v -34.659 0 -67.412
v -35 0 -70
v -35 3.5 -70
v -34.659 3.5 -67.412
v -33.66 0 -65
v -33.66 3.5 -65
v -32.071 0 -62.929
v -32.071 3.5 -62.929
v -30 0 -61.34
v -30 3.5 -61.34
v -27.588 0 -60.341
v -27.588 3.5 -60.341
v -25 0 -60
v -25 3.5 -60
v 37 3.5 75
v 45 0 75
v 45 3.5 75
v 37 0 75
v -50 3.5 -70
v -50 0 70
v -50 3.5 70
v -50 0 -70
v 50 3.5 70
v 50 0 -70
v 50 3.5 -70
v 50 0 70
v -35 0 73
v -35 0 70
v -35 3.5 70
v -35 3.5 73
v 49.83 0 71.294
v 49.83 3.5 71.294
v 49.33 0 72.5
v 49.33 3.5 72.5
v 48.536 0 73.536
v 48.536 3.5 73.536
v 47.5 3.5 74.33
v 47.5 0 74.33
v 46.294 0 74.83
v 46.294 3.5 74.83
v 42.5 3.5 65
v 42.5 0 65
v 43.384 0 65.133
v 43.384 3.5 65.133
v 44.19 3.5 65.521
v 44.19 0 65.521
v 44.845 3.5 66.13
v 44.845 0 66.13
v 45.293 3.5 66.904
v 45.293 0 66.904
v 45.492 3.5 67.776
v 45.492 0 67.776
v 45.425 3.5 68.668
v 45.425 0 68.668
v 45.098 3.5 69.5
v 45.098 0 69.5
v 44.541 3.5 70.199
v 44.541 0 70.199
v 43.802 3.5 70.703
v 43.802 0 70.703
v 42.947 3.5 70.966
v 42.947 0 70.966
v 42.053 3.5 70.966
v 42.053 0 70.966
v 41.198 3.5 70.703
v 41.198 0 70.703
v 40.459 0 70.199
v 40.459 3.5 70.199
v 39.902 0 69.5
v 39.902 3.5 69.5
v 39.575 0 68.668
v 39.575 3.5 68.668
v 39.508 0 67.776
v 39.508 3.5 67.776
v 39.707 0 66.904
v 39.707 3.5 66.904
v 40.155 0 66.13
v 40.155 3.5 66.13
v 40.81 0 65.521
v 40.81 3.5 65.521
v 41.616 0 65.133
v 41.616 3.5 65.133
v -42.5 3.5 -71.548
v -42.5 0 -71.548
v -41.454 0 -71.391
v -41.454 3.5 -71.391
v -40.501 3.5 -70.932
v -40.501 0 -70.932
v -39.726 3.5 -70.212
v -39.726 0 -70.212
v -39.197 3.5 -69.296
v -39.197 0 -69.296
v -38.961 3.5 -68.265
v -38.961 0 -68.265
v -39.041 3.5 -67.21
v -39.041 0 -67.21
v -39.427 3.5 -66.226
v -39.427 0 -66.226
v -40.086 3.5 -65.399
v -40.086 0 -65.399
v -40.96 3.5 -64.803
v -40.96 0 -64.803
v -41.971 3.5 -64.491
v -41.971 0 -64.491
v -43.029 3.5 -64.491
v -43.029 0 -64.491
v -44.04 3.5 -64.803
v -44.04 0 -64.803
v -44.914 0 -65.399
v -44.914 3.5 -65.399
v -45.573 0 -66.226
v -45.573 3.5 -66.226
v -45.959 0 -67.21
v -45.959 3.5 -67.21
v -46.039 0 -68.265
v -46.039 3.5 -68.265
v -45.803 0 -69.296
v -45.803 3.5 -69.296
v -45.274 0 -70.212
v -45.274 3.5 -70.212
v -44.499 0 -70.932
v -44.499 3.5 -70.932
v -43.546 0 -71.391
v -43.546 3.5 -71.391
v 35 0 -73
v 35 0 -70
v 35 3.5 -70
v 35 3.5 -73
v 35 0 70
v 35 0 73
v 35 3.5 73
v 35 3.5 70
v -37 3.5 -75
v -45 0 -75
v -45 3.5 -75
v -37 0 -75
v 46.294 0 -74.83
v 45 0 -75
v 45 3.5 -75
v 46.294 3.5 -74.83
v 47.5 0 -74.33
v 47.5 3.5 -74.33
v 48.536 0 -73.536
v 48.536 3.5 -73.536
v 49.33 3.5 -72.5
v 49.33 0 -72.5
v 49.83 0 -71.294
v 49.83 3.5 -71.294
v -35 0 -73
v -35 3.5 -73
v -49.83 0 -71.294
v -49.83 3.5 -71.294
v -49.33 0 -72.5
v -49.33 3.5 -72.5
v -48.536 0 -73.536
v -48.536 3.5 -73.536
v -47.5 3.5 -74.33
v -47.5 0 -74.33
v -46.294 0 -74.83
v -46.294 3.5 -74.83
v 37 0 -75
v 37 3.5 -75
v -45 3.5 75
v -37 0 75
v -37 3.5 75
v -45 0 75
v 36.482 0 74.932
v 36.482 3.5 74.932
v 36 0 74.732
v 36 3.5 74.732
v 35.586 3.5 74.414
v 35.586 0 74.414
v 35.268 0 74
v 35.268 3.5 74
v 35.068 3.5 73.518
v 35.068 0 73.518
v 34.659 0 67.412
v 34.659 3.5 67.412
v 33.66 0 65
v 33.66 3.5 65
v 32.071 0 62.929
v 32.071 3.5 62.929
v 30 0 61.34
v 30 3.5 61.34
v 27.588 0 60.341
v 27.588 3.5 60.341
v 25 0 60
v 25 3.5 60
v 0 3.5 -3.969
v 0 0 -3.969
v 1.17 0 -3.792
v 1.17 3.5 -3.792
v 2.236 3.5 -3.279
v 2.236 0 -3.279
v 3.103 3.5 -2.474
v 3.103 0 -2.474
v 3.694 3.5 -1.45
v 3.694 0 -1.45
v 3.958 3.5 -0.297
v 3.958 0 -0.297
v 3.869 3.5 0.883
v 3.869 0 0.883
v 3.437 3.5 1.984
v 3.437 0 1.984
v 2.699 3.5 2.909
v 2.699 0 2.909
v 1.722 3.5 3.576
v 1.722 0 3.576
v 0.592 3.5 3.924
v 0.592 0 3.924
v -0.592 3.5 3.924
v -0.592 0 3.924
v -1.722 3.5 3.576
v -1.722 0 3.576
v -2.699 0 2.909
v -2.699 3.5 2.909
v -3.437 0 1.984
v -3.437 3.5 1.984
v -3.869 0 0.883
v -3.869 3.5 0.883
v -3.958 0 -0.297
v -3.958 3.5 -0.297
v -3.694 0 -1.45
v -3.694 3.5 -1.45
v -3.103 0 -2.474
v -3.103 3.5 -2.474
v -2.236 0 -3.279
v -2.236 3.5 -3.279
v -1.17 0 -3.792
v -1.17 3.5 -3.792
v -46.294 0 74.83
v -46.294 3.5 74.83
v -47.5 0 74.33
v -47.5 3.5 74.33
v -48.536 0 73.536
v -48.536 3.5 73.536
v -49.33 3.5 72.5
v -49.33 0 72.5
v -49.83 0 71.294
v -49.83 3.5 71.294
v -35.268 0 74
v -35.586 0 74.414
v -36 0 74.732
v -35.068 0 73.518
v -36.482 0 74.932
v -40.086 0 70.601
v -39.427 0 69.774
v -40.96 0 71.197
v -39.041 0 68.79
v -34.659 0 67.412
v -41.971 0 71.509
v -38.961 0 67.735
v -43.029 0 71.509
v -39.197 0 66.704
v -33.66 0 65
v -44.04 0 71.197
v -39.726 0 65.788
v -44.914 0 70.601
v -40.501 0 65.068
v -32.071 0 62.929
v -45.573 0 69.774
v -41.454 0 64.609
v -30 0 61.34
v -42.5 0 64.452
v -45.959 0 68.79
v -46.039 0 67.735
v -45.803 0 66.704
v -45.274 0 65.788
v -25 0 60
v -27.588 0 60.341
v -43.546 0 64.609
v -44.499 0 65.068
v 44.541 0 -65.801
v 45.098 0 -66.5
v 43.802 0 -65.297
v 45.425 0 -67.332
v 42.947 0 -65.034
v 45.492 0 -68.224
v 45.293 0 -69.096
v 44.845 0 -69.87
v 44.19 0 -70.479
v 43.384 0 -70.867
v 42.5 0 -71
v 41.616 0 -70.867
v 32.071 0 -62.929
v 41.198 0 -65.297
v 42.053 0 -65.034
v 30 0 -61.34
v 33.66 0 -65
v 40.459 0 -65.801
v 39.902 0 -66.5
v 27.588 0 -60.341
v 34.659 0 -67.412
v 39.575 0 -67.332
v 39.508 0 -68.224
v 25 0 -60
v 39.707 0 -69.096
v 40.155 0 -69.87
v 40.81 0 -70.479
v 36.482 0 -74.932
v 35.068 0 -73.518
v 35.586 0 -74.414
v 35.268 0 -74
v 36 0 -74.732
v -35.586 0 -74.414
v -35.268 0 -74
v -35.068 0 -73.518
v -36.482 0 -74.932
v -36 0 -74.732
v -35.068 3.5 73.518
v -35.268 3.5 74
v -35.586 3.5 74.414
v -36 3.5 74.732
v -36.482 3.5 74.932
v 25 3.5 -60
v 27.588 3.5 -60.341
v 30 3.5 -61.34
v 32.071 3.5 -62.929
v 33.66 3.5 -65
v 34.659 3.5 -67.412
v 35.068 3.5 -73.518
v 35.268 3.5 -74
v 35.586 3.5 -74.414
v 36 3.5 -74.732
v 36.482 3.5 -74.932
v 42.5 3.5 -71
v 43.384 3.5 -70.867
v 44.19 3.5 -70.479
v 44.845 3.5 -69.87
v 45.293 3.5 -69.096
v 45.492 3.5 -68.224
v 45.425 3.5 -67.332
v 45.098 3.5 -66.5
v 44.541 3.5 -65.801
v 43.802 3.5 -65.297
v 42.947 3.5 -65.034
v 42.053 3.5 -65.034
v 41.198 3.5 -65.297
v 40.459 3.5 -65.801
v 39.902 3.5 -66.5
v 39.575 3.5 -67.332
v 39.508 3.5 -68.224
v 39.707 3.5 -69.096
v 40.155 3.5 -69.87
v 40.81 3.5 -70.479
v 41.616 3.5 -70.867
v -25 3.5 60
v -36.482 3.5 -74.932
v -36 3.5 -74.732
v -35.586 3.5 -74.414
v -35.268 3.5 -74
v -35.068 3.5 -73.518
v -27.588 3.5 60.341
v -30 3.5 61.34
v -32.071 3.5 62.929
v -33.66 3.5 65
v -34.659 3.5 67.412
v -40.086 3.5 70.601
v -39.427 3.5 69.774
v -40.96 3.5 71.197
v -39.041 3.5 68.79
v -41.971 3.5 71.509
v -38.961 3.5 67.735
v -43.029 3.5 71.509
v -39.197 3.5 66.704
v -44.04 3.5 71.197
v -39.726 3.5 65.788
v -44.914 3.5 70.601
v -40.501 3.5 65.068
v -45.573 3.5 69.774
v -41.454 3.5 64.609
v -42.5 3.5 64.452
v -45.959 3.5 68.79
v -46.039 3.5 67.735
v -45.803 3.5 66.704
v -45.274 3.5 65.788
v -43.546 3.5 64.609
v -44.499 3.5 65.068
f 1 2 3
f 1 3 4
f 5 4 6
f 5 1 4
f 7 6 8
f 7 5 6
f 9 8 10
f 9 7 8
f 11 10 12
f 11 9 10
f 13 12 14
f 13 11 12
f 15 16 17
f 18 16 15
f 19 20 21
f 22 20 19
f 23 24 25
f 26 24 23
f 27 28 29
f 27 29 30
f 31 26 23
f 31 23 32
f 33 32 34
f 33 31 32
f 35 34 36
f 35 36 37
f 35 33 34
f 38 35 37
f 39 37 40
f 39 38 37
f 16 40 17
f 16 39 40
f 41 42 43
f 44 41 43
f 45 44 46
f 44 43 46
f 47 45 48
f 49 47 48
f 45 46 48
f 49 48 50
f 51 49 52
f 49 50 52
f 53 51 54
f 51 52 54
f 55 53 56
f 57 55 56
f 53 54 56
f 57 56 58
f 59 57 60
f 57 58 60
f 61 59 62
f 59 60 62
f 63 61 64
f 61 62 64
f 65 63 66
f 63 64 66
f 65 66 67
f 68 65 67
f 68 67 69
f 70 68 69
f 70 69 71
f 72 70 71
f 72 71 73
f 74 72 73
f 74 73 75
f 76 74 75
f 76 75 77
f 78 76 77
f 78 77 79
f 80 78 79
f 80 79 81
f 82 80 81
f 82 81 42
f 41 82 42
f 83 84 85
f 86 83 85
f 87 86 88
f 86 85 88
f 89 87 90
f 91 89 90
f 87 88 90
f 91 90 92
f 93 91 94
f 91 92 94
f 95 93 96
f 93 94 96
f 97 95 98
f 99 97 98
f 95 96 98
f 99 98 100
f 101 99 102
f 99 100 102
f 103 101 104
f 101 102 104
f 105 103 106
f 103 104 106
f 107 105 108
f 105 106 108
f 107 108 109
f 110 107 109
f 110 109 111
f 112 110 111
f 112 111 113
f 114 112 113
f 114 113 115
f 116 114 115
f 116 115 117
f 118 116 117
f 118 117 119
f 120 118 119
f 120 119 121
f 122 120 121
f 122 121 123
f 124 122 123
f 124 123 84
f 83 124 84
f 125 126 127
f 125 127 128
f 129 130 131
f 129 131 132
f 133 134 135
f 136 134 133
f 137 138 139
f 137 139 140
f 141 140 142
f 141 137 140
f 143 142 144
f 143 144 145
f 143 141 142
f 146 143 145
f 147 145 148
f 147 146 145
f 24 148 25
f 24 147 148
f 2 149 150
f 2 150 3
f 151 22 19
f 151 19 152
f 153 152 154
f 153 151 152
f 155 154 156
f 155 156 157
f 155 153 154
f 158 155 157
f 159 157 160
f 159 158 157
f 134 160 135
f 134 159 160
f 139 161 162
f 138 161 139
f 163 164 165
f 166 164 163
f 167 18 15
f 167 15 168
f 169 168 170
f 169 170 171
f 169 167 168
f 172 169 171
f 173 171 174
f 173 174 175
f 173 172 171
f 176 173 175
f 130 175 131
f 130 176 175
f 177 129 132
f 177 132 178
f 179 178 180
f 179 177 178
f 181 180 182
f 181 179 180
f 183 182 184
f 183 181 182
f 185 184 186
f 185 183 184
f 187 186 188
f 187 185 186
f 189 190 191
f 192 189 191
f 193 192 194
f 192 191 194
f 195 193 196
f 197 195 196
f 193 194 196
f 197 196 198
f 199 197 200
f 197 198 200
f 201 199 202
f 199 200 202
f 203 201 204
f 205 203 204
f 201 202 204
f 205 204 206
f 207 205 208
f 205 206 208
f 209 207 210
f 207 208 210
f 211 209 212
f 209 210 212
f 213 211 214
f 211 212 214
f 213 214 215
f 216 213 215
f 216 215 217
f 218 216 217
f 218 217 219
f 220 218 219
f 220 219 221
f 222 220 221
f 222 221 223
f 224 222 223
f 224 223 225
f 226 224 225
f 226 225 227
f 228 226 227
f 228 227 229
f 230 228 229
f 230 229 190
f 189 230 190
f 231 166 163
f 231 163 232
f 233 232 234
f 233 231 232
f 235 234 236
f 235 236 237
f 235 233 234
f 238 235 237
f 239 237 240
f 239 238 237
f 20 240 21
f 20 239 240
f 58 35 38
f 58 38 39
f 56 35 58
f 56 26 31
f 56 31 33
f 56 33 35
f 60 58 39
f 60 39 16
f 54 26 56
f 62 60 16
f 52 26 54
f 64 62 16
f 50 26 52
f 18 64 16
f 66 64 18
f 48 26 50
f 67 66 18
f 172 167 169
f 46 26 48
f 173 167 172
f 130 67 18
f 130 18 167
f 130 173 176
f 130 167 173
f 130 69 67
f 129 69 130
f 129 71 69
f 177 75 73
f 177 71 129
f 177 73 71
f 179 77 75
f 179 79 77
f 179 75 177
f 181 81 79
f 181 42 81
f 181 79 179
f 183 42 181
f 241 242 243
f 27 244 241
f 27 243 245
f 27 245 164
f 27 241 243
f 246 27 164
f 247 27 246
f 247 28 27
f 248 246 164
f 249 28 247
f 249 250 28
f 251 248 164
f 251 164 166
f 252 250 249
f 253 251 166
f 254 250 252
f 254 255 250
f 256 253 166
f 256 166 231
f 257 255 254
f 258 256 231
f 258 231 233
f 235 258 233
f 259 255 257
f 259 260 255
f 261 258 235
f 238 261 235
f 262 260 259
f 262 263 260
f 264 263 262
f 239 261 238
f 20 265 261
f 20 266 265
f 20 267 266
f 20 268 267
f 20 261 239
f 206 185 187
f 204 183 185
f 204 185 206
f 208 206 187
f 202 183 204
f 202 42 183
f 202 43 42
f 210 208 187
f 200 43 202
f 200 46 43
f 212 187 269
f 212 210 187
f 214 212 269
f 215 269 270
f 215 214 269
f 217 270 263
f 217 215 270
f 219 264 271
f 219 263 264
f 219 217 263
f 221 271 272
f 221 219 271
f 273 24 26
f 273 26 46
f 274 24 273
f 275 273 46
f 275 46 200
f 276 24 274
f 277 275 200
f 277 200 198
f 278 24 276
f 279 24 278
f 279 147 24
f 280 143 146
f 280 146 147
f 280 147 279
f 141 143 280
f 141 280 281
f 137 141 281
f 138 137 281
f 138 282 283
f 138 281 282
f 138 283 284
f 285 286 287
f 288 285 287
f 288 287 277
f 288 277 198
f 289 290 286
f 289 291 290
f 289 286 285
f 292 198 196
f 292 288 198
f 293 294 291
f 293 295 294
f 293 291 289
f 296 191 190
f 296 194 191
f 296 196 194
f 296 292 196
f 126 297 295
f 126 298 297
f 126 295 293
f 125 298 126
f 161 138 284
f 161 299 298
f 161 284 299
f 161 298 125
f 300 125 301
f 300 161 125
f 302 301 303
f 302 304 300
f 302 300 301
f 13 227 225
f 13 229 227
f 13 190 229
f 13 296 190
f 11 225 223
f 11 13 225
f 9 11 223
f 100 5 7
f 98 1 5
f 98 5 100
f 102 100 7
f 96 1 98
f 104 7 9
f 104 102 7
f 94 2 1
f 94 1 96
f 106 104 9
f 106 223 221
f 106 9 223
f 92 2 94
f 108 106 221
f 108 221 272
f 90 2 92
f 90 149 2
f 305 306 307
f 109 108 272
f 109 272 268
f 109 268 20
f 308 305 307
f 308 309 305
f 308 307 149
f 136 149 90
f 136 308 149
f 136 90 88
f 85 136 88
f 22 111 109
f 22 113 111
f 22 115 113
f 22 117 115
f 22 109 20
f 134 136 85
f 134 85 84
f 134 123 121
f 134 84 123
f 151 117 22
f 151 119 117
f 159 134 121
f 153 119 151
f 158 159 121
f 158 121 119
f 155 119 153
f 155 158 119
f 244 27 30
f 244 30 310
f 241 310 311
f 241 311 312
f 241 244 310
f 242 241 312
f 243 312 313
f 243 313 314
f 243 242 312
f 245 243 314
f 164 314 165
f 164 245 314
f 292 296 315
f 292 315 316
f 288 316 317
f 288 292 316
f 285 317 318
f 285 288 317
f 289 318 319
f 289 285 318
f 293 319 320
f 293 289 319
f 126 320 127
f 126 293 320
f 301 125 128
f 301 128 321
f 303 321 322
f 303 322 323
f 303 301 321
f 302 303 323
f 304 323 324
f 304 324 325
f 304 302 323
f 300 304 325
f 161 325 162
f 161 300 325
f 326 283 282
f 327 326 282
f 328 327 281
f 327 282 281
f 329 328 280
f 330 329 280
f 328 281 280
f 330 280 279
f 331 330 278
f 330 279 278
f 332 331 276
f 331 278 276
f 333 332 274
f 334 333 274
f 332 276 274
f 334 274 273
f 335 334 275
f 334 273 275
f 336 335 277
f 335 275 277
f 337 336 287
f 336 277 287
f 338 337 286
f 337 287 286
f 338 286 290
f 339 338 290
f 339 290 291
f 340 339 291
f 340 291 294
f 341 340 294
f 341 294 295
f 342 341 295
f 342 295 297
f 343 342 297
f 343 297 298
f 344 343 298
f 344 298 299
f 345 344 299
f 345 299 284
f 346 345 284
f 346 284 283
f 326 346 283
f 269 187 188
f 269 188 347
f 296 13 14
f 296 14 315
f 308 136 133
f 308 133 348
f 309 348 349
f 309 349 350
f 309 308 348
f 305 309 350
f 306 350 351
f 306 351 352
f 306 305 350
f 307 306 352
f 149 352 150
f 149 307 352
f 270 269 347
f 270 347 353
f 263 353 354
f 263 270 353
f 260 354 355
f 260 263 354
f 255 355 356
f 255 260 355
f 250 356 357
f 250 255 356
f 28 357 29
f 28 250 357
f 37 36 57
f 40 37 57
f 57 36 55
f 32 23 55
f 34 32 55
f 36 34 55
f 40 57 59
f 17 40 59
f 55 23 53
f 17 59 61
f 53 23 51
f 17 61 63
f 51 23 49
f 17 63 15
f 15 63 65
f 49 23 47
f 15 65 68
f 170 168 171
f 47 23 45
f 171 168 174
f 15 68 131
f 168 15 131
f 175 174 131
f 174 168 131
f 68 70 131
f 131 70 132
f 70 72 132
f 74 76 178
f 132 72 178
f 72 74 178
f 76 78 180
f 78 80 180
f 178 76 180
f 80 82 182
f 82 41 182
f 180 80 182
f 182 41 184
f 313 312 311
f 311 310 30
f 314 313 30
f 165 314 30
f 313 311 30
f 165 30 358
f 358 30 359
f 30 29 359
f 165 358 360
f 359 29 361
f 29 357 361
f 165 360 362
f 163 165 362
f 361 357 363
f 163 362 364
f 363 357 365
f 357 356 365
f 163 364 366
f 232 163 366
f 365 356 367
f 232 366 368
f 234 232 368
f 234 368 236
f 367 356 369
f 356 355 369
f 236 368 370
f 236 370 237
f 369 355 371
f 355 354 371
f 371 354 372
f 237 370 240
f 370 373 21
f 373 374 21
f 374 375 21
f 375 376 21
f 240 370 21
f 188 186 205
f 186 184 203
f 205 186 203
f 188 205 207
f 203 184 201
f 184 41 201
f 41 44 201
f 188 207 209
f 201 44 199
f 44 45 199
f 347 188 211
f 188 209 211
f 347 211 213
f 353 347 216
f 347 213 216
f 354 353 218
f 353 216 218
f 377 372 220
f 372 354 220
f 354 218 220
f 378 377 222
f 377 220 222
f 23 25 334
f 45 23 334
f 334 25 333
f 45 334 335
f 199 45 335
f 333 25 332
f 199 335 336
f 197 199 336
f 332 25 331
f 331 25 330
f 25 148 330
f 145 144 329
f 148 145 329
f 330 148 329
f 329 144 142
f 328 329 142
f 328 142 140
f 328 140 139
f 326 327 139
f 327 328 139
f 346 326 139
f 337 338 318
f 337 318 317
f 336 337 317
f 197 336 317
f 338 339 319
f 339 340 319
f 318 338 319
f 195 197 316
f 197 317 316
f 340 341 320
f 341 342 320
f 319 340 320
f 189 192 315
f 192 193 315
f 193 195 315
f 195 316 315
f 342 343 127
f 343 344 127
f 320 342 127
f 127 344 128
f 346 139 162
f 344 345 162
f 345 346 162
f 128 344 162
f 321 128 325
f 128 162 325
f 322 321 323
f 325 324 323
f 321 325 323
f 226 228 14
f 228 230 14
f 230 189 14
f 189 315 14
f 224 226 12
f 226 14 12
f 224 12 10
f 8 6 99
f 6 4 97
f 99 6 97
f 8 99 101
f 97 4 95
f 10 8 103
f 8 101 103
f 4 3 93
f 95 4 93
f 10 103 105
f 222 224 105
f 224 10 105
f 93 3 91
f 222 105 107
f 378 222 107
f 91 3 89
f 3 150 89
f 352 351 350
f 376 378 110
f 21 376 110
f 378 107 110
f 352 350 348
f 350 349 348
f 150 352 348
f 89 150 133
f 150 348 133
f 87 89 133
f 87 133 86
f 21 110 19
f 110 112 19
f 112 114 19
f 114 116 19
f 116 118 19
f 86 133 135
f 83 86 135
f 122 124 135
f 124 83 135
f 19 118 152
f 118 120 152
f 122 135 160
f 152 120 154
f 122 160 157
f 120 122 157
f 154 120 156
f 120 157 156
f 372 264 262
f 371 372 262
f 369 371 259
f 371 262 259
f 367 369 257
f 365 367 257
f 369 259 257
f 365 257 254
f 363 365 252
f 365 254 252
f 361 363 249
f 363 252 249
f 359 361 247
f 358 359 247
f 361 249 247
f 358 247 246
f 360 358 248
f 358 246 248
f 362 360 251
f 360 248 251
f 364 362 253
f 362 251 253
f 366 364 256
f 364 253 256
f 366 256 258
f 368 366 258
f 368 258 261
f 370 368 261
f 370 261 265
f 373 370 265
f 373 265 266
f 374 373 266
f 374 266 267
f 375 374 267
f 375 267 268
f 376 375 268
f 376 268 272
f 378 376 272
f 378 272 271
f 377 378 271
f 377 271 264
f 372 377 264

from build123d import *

# Parameters (mm, degrees)
BOSS_EXTRUDE1_DEPTH = 3.5
SKETCH2_R           = 3.96875
SKETCH2_R_2         = 3
SKETCH2_R_3         = 3.54844416
CUT_EXTRUDE3_DEPTH  = 6


with BuildPart() as part:
    # Sketch1 → Boss-Extrude1 (new body)
    with BuildSketch(Plane(origin=(0, 0, 0), x_dir=(1, 0, 0), z_dir=(0, 1, 0))):
        with BuildLine():
            Line((-25, 60), (25, 60))
            ThreePointArc((25, 60), (32.071067812, 62.928932188), (35, 70))
            Line((35, 70), (35, 73))
            ThreePointArc((35, 73), (35.585786438, 74.414213562), (37, 75))
            Line((37, 75), (45, 75))
            ThreePointArc((45, 75), (48.535533906, 73.535533906), (50, 70))
            Line((50, 70), (50, -70))
            ThreePointArc((50, -70), (48.535533906, -73.535533906), (45, -75))
            Line((45, -75), (37, -75))
            ThreePointArc((37, -75), (35.585786438, -74.414213562), (35, -73))
            Line((35, -73), (35, -70))
            ThreePointArc((35, -70), (32.071067812, -62.928932188), (25, -60))
            Line((25, -60), (-25, -60))
            ThreePointArc((-25, -60), (-32.071067812, -62.928932188), (-35, -70))
            Line((-35, -70), (-35, -73))
            ThreePointArc((-35, -73), (-35.585786438, -74.414213562), (-37, -75))
            Line((-37, -75), (-45, -75))
            ThreePointArc((-45, -75), (-48.535533906, -73.535533906), (-50, -70))
            Line((-50, -70), (-50, 70))
            ThreePointArc((-50, 70), (-48.535533906, 73.535533906), (-45, 75))
            Line((-45, 75), (-37, 75))
            ThreePointArc((-37, 75), (-35.585786438, 74.414213562), (-35, 73))
            Line((-35, 73), (-35, 70))
            ThreePointArc((-35, 70), (-32.071067812, 62.928932188), (-25, 60))
        make_face()
    extrude(amount=BOSS_EXTRUDE1_DEPTH)

    # Sketch2 → Cut-Extrude3 (cut)
    with BuildSketch(Plane.XZ):
        with Locations(Location((0, 0, 0), (0, 0, 270))):
            Circle(SKETCH2_R)
        with Locations(Location((42.5, -68, 0), (0, 0, 270))):
            Circle(SKETCH2_R_2)
        with Locations(Location((-42.5, -68, 0), (0, 0, 270))):
            Circle(SKETCH2_R_3)
        with Locations(Location((42.5, 68, 0), (0, 0, 270))):
            Circle(SKETCH2_R_2)
        with Locations(Location((-42.5, 68, 0), (0, 0, 270))):
            Circle(SKETCH2_R_3)
    extrude(amount=-CUT_EXTRUDE3_DEPTH, mode=Mode.SUBTRACT)


solid = part.part
